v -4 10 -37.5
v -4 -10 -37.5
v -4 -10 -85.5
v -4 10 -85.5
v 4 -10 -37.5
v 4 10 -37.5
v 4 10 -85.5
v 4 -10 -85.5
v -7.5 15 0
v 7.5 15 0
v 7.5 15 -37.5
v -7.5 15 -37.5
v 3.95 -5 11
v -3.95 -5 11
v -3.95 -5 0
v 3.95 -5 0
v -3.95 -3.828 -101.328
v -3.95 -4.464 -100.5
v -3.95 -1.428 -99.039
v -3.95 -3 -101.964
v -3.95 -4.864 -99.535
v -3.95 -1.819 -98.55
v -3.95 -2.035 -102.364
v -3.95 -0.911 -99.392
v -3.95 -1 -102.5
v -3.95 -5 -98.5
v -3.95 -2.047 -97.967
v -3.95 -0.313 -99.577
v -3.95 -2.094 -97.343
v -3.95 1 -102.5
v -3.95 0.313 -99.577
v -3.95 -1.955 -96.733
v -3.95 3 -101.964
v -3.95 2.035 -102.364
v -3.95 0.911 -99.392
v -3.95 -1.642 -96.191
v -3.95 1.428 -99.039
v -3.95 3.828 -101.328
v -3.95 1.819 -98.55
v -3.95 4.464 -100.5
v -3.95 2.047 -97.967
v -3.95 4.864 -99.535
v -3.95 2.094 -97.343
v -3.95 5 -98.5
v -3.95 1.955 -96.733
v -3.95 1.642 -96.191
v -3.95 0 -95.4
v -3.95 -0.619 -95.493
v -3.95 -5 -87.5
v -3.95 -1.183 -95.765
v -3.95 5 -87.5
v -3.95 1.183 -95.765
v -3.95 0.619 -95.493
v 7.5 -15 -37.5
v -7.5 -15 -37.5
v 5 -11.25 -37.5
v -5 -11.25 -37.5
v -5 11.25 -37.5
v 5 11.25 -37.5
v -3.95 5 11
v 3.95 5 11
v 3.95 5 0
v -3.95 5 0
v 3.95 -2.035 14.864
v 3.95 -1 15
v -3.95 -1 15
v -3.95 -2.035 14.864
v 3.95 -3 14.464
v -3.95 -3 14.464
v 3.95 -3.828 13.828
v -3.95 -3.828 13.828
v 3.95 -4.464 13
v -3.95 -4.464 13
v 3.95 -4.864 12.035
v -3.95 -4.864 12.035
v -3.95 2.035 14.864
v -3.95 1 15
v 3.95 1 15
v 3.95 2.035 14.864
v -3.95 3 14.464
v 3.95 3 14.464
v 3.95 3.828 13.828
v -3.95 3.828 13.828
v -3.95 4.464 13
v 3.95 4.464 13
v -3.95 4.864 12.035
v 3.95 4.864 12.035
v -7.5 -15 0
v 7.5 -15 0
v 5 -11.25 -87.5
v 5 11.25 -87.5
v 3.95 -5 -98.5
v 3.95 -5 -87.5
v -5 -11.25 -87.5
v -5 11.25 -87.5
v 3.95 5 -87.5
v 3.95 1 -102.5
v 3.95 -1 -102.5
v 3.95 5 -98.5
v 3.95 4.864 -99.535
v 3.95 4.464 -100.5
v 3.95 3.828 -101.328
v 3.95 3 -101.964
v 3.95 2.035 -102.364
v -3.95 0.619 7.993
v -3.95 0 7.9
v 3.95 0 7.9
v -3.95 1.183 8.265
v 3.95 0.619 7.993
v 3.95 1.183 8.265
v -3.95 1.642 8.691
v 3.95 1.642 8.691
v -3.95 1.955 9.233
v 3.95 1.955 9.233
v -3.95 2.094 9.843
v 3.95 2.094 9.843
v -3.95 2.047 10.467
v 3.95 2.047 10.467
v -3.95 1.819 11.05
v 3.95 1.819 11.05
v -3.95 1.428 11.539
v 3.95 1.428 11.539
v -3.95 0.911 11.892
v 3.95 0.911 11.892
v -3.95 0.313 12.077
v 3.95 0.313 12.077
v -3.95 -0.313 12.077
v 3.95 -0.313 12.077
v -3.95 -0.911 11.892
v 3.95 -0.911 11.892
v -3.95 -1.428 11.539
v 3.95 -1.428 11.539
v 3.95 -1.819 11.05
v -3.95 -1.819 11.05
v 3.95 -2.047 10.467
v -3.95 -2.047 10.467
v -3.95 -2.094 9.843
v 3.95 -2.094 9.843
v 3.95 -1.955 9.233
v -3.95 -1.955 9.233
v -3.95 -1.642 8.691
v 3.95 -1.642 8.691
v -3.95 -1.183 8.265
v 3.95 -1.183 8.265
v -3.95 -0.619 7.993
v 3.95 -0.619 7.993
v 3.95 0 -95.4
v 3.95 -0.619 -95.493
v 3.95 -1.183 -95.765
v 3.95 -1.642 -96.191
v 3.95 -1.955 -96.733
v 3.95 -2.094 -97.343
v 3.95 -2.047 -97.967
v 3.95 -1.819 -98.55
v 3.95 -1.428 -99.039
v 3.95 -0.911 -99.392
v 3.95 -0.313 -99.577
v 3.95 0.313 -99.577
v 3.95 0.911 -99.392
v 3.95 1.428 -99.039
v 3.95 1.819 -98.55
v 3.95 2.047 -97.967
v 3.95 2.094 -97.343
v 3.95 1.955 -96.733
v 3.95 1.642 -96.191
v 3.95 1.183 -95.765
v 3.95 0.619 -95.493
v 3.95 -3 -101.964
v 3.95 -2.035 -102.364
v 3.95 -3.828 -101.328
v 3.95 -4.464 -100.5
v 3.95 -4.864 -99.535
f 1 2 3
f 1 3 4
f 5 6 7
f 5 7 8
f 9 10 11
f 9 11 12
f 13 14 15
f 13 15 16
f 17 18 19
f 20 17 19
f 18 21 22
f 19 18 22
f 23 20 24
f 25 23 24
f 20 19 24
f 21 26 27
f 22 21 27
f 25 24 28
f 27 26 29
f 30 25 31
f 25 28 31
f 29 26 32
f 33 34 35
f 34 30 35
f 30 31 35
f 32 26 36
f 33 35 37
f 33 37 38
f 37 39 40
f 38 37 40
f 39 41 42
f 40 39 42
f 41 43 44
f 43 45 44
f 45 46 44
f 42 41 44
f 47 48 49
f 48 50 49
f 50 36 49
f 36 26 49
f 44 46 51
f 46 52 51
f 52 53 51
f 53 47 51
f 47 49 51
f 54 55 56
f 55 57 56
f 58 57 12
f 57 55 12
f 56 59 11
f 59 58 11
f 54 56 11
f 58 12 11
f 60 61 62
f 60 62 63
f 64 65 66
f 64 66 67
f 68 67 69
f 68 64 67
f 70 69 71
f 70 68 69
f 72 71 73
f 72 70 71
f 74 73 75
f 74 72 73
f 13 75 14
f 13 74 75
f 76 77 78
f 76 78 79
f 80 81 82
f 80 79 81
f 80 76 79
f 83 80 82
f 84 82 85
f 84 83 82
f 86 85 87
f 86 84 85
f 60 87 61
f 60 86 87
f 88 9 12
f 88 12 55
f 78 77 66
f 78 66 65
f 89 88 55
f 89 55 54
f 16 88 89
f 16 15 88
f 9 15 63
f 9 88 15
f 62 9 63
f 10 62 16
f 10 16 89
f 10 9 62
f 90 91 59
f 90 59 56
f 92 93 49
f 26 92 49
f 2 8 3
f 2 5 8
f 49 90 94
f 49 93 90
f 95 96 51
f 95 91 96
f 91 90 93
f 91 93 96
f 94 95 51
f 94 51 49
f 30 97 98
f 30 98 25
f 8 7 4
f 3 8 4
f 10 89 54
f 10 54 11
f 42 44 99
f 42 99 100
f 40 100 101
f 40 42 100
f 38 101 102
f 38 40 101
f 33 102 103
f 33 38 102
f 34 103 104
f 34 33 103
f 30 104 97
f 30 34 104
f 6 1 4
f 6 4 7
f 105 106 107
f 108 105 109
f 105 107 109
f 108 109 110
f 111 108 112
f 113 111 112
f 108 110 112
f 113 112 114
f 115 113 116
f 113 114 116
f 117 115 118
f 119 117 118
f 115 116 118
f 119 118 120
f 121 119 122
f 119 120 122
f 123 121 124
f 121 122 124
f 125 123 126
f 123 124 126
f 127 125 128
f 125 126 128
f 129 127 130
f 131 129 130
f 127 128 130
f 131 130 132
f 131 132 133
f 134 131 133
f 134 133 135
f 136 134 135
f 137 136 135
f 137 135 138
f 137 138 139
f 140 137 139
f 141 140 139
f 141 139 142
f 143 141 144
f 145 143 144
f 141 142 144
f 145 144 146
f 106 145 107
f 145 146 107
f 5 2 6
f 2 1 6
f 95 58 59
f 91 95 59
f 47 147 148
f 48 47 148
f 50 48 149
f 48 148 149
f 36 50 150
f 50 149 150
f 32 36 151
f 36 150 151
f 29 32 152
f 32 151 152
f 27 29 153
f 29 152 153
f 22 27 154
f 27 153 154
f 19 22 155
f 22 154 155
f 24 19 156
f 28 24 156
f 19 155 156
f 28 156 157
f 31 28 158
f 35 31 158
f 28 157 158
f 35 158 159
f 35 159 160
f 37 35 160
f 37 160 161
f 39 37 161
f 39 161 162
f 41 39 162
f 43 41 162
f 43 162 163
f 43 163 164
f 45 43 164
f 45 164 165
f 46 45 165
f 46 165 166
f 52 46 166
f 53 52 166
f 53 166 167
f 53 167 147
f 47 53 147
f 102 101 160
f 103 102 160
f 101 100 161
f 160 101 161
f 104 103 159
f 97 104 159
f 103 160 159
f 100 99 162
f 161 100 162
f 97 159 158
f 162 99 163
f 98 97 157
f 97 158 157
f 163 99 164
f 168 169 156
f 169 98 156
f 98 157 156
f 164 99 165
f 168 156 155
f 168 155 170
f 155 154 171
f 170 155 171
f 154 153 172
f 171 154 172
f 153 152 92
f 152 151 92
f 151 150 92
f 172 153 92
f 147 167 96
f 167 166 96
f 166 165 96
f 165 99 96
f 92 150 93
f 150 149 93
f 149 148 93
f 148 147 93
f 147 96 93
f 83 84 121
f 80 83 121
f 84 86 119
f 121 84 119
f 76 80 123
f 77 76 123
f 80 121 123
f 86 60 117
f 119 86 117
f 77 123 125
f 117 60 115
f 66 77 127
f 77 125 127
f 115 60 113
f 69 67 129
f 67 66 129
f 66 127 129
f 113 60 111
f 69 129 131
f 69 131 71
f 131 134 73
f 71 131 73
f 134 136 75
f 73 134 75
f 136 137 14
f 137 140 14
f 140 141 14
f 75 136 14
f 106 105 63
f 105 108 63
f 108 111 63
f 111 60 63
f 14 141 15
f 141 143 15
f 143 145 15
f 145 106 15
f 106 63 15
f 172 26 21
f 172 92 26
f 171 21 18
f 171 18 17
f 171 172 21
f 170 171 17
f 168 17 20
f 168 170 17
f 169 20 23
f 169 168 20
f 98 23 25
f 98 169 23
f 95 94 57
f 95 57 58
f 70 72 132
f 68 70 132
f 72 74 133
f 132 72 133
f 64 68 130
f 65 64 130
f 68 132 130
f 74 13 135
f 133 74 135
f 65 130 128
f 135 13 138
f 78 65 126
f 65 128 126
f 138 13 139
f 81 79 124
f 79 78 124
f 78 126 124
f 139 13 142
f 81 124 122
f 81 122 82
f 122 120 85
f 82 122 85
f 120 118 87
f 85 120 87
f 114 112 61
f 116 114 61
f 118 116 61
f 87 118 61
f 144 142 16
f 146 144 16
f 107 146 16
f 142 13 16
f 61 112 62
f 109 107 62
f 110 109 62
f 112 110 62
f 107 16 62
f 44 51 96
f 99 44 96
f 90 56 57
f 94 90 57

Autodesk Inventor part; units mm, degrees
ref_plane "YZ Plane" through (0, 0, 0) normal (1, 0, 0) x (0, 1, 0)
ref_plane "XZ Plane" through (0, 0, 0) normal (0, 1, 0) x (-1, 0, 0)
sketch "스케치1" plane through (0, 0, 0) normal (0, 0, 1) x (1, 0, 0)
  line L0 (-7.5, -15) -> (7.5, -15)
  line L1 (7.5, -15) -> (7.5, 15)
  line L2 (7.5, 15) -> (-7.5, 15)
  line L3 (-7.5, 15) -> (-7.5, -15)
  point P0 (0, 0)
  dimension "d0" = 15
  dimension "d1" = 30
  dimension "d2" = 15
  dimension "d3" = 7.5
extrude "돌출1" add sketch "스케치1" against normal blind 37.5
sketch "스케치2" plane through (0, 0, -37.5) normal (0, 0, -1) x (-1, 0, 0)
  line L0 (5, 11.25) -> (-5, 11.25)
  line L1 (-5, 11.25) -> (-5, -11.25)
  line L2 (-5, -11.25) -> (5, -11.25)
  line L3 (5, -11.25) -> (5, 11.25)
  line L4 (5, 11.25) -> (-5, -11.25) construction
  line L5 (-5, 11.25) -> (5, -11.25) construction
  line L6 (-4, -10) -> (4, -10)
  line L7 (4, -10) -> (4, 10)
  line L8 (4, 10) -> (-4, 10)
  line L9 (-4, 10) -> (-4, -10)
  line L10 (-4, -10) -> (4, 10) construction
  line L11 (4, -10) -> (-4, 10) construction
  point P0 (0, 0)
  dimension "d6" = 10
  dimension "d7" = 22.5
  dimension "d10" = 8
  dimension "d11" = 20
extrude "돌출2" add sketch "스케치2" along normal blind 50
sketch "스케치3" plane through (0, 0, 0) normal (0, 0, 1) x (1, 0, 0)
  line L0 (-3.95, -5) -> (3.95, -5)
  line L1 (3.95, -5) -> (3.95, 5)
  line L2 (3.95, 5) -> (-3.95, 5)
  line L3 (-3.95, 5) -> (-3.95, -5)
  line L4 (-3.95, -5) -> (3.95, 5) construction
  line L5 (3.95, -5) -> (-3.95, 5) construction
  point P0 (0, 0)
  dimension "d12" = 7.9
  dimension "d13" = 10
extrude "돌출3" add sketch "스케치3" along normal blind 15
sketch "스케치4" plane through (3.95, -5, 0) normal (1, 0, 0) x (0, 0, -1)
  circle A0 centre (-10, 5) radius 2.1
  line L0 (0, 0) -> (-15, 0) projected
  line L1 (-15, 0) -> (-15, 10) projected
  point P0 (0, 5)
  dimension "d16" = 4.2
  dimension "d17" = 5
  dimension "d18" = 5
extrude "돌출4" cut sketch "스케치4" against normal blind 15
sketch "스케치5" plane through (0, 0, -87.5) normal (0, 0, -1) x (-1, 0, 0)
  line L0 (-5, 11.25) -> (5, 11.25) projected
  line L1 (5, -11.25) -> (-5, -11.25) projected
  line L2 (5, 11.25) -> (-5, 11.25)
  line L3 (-5, 11.25) -> (-5, -11.25)
  line L4 (-5, -11.25) -> (5, -11.25)
  line L5 (5, -11.25) -> (5, 11.25)
  point P0 (7.5, 15)
  point P1 (-7.5, -15)
extrude "돌출5" add sketch "스케치5" against normal blind 2
ref_plane "작업 평면1" through (0, 0, -43.75) normal (0, 0, 1) x (1, 0, 0)
mirror "미러1" about plane through (0, 0, -43.75) normal (0, 0, 1) of "돌출3"
mirror "미러2" about plane through (0, 0, -43.75) normal (0, 0, 1) of "돌출4"
fillet "모깎기1" radius 4 4 edges at (0, -5, 15) (0, 5, 15) (0, -5, -102.5) (0, 5, -102.5)
properties part number "각도조절 액추에이터_최소" material "납"
